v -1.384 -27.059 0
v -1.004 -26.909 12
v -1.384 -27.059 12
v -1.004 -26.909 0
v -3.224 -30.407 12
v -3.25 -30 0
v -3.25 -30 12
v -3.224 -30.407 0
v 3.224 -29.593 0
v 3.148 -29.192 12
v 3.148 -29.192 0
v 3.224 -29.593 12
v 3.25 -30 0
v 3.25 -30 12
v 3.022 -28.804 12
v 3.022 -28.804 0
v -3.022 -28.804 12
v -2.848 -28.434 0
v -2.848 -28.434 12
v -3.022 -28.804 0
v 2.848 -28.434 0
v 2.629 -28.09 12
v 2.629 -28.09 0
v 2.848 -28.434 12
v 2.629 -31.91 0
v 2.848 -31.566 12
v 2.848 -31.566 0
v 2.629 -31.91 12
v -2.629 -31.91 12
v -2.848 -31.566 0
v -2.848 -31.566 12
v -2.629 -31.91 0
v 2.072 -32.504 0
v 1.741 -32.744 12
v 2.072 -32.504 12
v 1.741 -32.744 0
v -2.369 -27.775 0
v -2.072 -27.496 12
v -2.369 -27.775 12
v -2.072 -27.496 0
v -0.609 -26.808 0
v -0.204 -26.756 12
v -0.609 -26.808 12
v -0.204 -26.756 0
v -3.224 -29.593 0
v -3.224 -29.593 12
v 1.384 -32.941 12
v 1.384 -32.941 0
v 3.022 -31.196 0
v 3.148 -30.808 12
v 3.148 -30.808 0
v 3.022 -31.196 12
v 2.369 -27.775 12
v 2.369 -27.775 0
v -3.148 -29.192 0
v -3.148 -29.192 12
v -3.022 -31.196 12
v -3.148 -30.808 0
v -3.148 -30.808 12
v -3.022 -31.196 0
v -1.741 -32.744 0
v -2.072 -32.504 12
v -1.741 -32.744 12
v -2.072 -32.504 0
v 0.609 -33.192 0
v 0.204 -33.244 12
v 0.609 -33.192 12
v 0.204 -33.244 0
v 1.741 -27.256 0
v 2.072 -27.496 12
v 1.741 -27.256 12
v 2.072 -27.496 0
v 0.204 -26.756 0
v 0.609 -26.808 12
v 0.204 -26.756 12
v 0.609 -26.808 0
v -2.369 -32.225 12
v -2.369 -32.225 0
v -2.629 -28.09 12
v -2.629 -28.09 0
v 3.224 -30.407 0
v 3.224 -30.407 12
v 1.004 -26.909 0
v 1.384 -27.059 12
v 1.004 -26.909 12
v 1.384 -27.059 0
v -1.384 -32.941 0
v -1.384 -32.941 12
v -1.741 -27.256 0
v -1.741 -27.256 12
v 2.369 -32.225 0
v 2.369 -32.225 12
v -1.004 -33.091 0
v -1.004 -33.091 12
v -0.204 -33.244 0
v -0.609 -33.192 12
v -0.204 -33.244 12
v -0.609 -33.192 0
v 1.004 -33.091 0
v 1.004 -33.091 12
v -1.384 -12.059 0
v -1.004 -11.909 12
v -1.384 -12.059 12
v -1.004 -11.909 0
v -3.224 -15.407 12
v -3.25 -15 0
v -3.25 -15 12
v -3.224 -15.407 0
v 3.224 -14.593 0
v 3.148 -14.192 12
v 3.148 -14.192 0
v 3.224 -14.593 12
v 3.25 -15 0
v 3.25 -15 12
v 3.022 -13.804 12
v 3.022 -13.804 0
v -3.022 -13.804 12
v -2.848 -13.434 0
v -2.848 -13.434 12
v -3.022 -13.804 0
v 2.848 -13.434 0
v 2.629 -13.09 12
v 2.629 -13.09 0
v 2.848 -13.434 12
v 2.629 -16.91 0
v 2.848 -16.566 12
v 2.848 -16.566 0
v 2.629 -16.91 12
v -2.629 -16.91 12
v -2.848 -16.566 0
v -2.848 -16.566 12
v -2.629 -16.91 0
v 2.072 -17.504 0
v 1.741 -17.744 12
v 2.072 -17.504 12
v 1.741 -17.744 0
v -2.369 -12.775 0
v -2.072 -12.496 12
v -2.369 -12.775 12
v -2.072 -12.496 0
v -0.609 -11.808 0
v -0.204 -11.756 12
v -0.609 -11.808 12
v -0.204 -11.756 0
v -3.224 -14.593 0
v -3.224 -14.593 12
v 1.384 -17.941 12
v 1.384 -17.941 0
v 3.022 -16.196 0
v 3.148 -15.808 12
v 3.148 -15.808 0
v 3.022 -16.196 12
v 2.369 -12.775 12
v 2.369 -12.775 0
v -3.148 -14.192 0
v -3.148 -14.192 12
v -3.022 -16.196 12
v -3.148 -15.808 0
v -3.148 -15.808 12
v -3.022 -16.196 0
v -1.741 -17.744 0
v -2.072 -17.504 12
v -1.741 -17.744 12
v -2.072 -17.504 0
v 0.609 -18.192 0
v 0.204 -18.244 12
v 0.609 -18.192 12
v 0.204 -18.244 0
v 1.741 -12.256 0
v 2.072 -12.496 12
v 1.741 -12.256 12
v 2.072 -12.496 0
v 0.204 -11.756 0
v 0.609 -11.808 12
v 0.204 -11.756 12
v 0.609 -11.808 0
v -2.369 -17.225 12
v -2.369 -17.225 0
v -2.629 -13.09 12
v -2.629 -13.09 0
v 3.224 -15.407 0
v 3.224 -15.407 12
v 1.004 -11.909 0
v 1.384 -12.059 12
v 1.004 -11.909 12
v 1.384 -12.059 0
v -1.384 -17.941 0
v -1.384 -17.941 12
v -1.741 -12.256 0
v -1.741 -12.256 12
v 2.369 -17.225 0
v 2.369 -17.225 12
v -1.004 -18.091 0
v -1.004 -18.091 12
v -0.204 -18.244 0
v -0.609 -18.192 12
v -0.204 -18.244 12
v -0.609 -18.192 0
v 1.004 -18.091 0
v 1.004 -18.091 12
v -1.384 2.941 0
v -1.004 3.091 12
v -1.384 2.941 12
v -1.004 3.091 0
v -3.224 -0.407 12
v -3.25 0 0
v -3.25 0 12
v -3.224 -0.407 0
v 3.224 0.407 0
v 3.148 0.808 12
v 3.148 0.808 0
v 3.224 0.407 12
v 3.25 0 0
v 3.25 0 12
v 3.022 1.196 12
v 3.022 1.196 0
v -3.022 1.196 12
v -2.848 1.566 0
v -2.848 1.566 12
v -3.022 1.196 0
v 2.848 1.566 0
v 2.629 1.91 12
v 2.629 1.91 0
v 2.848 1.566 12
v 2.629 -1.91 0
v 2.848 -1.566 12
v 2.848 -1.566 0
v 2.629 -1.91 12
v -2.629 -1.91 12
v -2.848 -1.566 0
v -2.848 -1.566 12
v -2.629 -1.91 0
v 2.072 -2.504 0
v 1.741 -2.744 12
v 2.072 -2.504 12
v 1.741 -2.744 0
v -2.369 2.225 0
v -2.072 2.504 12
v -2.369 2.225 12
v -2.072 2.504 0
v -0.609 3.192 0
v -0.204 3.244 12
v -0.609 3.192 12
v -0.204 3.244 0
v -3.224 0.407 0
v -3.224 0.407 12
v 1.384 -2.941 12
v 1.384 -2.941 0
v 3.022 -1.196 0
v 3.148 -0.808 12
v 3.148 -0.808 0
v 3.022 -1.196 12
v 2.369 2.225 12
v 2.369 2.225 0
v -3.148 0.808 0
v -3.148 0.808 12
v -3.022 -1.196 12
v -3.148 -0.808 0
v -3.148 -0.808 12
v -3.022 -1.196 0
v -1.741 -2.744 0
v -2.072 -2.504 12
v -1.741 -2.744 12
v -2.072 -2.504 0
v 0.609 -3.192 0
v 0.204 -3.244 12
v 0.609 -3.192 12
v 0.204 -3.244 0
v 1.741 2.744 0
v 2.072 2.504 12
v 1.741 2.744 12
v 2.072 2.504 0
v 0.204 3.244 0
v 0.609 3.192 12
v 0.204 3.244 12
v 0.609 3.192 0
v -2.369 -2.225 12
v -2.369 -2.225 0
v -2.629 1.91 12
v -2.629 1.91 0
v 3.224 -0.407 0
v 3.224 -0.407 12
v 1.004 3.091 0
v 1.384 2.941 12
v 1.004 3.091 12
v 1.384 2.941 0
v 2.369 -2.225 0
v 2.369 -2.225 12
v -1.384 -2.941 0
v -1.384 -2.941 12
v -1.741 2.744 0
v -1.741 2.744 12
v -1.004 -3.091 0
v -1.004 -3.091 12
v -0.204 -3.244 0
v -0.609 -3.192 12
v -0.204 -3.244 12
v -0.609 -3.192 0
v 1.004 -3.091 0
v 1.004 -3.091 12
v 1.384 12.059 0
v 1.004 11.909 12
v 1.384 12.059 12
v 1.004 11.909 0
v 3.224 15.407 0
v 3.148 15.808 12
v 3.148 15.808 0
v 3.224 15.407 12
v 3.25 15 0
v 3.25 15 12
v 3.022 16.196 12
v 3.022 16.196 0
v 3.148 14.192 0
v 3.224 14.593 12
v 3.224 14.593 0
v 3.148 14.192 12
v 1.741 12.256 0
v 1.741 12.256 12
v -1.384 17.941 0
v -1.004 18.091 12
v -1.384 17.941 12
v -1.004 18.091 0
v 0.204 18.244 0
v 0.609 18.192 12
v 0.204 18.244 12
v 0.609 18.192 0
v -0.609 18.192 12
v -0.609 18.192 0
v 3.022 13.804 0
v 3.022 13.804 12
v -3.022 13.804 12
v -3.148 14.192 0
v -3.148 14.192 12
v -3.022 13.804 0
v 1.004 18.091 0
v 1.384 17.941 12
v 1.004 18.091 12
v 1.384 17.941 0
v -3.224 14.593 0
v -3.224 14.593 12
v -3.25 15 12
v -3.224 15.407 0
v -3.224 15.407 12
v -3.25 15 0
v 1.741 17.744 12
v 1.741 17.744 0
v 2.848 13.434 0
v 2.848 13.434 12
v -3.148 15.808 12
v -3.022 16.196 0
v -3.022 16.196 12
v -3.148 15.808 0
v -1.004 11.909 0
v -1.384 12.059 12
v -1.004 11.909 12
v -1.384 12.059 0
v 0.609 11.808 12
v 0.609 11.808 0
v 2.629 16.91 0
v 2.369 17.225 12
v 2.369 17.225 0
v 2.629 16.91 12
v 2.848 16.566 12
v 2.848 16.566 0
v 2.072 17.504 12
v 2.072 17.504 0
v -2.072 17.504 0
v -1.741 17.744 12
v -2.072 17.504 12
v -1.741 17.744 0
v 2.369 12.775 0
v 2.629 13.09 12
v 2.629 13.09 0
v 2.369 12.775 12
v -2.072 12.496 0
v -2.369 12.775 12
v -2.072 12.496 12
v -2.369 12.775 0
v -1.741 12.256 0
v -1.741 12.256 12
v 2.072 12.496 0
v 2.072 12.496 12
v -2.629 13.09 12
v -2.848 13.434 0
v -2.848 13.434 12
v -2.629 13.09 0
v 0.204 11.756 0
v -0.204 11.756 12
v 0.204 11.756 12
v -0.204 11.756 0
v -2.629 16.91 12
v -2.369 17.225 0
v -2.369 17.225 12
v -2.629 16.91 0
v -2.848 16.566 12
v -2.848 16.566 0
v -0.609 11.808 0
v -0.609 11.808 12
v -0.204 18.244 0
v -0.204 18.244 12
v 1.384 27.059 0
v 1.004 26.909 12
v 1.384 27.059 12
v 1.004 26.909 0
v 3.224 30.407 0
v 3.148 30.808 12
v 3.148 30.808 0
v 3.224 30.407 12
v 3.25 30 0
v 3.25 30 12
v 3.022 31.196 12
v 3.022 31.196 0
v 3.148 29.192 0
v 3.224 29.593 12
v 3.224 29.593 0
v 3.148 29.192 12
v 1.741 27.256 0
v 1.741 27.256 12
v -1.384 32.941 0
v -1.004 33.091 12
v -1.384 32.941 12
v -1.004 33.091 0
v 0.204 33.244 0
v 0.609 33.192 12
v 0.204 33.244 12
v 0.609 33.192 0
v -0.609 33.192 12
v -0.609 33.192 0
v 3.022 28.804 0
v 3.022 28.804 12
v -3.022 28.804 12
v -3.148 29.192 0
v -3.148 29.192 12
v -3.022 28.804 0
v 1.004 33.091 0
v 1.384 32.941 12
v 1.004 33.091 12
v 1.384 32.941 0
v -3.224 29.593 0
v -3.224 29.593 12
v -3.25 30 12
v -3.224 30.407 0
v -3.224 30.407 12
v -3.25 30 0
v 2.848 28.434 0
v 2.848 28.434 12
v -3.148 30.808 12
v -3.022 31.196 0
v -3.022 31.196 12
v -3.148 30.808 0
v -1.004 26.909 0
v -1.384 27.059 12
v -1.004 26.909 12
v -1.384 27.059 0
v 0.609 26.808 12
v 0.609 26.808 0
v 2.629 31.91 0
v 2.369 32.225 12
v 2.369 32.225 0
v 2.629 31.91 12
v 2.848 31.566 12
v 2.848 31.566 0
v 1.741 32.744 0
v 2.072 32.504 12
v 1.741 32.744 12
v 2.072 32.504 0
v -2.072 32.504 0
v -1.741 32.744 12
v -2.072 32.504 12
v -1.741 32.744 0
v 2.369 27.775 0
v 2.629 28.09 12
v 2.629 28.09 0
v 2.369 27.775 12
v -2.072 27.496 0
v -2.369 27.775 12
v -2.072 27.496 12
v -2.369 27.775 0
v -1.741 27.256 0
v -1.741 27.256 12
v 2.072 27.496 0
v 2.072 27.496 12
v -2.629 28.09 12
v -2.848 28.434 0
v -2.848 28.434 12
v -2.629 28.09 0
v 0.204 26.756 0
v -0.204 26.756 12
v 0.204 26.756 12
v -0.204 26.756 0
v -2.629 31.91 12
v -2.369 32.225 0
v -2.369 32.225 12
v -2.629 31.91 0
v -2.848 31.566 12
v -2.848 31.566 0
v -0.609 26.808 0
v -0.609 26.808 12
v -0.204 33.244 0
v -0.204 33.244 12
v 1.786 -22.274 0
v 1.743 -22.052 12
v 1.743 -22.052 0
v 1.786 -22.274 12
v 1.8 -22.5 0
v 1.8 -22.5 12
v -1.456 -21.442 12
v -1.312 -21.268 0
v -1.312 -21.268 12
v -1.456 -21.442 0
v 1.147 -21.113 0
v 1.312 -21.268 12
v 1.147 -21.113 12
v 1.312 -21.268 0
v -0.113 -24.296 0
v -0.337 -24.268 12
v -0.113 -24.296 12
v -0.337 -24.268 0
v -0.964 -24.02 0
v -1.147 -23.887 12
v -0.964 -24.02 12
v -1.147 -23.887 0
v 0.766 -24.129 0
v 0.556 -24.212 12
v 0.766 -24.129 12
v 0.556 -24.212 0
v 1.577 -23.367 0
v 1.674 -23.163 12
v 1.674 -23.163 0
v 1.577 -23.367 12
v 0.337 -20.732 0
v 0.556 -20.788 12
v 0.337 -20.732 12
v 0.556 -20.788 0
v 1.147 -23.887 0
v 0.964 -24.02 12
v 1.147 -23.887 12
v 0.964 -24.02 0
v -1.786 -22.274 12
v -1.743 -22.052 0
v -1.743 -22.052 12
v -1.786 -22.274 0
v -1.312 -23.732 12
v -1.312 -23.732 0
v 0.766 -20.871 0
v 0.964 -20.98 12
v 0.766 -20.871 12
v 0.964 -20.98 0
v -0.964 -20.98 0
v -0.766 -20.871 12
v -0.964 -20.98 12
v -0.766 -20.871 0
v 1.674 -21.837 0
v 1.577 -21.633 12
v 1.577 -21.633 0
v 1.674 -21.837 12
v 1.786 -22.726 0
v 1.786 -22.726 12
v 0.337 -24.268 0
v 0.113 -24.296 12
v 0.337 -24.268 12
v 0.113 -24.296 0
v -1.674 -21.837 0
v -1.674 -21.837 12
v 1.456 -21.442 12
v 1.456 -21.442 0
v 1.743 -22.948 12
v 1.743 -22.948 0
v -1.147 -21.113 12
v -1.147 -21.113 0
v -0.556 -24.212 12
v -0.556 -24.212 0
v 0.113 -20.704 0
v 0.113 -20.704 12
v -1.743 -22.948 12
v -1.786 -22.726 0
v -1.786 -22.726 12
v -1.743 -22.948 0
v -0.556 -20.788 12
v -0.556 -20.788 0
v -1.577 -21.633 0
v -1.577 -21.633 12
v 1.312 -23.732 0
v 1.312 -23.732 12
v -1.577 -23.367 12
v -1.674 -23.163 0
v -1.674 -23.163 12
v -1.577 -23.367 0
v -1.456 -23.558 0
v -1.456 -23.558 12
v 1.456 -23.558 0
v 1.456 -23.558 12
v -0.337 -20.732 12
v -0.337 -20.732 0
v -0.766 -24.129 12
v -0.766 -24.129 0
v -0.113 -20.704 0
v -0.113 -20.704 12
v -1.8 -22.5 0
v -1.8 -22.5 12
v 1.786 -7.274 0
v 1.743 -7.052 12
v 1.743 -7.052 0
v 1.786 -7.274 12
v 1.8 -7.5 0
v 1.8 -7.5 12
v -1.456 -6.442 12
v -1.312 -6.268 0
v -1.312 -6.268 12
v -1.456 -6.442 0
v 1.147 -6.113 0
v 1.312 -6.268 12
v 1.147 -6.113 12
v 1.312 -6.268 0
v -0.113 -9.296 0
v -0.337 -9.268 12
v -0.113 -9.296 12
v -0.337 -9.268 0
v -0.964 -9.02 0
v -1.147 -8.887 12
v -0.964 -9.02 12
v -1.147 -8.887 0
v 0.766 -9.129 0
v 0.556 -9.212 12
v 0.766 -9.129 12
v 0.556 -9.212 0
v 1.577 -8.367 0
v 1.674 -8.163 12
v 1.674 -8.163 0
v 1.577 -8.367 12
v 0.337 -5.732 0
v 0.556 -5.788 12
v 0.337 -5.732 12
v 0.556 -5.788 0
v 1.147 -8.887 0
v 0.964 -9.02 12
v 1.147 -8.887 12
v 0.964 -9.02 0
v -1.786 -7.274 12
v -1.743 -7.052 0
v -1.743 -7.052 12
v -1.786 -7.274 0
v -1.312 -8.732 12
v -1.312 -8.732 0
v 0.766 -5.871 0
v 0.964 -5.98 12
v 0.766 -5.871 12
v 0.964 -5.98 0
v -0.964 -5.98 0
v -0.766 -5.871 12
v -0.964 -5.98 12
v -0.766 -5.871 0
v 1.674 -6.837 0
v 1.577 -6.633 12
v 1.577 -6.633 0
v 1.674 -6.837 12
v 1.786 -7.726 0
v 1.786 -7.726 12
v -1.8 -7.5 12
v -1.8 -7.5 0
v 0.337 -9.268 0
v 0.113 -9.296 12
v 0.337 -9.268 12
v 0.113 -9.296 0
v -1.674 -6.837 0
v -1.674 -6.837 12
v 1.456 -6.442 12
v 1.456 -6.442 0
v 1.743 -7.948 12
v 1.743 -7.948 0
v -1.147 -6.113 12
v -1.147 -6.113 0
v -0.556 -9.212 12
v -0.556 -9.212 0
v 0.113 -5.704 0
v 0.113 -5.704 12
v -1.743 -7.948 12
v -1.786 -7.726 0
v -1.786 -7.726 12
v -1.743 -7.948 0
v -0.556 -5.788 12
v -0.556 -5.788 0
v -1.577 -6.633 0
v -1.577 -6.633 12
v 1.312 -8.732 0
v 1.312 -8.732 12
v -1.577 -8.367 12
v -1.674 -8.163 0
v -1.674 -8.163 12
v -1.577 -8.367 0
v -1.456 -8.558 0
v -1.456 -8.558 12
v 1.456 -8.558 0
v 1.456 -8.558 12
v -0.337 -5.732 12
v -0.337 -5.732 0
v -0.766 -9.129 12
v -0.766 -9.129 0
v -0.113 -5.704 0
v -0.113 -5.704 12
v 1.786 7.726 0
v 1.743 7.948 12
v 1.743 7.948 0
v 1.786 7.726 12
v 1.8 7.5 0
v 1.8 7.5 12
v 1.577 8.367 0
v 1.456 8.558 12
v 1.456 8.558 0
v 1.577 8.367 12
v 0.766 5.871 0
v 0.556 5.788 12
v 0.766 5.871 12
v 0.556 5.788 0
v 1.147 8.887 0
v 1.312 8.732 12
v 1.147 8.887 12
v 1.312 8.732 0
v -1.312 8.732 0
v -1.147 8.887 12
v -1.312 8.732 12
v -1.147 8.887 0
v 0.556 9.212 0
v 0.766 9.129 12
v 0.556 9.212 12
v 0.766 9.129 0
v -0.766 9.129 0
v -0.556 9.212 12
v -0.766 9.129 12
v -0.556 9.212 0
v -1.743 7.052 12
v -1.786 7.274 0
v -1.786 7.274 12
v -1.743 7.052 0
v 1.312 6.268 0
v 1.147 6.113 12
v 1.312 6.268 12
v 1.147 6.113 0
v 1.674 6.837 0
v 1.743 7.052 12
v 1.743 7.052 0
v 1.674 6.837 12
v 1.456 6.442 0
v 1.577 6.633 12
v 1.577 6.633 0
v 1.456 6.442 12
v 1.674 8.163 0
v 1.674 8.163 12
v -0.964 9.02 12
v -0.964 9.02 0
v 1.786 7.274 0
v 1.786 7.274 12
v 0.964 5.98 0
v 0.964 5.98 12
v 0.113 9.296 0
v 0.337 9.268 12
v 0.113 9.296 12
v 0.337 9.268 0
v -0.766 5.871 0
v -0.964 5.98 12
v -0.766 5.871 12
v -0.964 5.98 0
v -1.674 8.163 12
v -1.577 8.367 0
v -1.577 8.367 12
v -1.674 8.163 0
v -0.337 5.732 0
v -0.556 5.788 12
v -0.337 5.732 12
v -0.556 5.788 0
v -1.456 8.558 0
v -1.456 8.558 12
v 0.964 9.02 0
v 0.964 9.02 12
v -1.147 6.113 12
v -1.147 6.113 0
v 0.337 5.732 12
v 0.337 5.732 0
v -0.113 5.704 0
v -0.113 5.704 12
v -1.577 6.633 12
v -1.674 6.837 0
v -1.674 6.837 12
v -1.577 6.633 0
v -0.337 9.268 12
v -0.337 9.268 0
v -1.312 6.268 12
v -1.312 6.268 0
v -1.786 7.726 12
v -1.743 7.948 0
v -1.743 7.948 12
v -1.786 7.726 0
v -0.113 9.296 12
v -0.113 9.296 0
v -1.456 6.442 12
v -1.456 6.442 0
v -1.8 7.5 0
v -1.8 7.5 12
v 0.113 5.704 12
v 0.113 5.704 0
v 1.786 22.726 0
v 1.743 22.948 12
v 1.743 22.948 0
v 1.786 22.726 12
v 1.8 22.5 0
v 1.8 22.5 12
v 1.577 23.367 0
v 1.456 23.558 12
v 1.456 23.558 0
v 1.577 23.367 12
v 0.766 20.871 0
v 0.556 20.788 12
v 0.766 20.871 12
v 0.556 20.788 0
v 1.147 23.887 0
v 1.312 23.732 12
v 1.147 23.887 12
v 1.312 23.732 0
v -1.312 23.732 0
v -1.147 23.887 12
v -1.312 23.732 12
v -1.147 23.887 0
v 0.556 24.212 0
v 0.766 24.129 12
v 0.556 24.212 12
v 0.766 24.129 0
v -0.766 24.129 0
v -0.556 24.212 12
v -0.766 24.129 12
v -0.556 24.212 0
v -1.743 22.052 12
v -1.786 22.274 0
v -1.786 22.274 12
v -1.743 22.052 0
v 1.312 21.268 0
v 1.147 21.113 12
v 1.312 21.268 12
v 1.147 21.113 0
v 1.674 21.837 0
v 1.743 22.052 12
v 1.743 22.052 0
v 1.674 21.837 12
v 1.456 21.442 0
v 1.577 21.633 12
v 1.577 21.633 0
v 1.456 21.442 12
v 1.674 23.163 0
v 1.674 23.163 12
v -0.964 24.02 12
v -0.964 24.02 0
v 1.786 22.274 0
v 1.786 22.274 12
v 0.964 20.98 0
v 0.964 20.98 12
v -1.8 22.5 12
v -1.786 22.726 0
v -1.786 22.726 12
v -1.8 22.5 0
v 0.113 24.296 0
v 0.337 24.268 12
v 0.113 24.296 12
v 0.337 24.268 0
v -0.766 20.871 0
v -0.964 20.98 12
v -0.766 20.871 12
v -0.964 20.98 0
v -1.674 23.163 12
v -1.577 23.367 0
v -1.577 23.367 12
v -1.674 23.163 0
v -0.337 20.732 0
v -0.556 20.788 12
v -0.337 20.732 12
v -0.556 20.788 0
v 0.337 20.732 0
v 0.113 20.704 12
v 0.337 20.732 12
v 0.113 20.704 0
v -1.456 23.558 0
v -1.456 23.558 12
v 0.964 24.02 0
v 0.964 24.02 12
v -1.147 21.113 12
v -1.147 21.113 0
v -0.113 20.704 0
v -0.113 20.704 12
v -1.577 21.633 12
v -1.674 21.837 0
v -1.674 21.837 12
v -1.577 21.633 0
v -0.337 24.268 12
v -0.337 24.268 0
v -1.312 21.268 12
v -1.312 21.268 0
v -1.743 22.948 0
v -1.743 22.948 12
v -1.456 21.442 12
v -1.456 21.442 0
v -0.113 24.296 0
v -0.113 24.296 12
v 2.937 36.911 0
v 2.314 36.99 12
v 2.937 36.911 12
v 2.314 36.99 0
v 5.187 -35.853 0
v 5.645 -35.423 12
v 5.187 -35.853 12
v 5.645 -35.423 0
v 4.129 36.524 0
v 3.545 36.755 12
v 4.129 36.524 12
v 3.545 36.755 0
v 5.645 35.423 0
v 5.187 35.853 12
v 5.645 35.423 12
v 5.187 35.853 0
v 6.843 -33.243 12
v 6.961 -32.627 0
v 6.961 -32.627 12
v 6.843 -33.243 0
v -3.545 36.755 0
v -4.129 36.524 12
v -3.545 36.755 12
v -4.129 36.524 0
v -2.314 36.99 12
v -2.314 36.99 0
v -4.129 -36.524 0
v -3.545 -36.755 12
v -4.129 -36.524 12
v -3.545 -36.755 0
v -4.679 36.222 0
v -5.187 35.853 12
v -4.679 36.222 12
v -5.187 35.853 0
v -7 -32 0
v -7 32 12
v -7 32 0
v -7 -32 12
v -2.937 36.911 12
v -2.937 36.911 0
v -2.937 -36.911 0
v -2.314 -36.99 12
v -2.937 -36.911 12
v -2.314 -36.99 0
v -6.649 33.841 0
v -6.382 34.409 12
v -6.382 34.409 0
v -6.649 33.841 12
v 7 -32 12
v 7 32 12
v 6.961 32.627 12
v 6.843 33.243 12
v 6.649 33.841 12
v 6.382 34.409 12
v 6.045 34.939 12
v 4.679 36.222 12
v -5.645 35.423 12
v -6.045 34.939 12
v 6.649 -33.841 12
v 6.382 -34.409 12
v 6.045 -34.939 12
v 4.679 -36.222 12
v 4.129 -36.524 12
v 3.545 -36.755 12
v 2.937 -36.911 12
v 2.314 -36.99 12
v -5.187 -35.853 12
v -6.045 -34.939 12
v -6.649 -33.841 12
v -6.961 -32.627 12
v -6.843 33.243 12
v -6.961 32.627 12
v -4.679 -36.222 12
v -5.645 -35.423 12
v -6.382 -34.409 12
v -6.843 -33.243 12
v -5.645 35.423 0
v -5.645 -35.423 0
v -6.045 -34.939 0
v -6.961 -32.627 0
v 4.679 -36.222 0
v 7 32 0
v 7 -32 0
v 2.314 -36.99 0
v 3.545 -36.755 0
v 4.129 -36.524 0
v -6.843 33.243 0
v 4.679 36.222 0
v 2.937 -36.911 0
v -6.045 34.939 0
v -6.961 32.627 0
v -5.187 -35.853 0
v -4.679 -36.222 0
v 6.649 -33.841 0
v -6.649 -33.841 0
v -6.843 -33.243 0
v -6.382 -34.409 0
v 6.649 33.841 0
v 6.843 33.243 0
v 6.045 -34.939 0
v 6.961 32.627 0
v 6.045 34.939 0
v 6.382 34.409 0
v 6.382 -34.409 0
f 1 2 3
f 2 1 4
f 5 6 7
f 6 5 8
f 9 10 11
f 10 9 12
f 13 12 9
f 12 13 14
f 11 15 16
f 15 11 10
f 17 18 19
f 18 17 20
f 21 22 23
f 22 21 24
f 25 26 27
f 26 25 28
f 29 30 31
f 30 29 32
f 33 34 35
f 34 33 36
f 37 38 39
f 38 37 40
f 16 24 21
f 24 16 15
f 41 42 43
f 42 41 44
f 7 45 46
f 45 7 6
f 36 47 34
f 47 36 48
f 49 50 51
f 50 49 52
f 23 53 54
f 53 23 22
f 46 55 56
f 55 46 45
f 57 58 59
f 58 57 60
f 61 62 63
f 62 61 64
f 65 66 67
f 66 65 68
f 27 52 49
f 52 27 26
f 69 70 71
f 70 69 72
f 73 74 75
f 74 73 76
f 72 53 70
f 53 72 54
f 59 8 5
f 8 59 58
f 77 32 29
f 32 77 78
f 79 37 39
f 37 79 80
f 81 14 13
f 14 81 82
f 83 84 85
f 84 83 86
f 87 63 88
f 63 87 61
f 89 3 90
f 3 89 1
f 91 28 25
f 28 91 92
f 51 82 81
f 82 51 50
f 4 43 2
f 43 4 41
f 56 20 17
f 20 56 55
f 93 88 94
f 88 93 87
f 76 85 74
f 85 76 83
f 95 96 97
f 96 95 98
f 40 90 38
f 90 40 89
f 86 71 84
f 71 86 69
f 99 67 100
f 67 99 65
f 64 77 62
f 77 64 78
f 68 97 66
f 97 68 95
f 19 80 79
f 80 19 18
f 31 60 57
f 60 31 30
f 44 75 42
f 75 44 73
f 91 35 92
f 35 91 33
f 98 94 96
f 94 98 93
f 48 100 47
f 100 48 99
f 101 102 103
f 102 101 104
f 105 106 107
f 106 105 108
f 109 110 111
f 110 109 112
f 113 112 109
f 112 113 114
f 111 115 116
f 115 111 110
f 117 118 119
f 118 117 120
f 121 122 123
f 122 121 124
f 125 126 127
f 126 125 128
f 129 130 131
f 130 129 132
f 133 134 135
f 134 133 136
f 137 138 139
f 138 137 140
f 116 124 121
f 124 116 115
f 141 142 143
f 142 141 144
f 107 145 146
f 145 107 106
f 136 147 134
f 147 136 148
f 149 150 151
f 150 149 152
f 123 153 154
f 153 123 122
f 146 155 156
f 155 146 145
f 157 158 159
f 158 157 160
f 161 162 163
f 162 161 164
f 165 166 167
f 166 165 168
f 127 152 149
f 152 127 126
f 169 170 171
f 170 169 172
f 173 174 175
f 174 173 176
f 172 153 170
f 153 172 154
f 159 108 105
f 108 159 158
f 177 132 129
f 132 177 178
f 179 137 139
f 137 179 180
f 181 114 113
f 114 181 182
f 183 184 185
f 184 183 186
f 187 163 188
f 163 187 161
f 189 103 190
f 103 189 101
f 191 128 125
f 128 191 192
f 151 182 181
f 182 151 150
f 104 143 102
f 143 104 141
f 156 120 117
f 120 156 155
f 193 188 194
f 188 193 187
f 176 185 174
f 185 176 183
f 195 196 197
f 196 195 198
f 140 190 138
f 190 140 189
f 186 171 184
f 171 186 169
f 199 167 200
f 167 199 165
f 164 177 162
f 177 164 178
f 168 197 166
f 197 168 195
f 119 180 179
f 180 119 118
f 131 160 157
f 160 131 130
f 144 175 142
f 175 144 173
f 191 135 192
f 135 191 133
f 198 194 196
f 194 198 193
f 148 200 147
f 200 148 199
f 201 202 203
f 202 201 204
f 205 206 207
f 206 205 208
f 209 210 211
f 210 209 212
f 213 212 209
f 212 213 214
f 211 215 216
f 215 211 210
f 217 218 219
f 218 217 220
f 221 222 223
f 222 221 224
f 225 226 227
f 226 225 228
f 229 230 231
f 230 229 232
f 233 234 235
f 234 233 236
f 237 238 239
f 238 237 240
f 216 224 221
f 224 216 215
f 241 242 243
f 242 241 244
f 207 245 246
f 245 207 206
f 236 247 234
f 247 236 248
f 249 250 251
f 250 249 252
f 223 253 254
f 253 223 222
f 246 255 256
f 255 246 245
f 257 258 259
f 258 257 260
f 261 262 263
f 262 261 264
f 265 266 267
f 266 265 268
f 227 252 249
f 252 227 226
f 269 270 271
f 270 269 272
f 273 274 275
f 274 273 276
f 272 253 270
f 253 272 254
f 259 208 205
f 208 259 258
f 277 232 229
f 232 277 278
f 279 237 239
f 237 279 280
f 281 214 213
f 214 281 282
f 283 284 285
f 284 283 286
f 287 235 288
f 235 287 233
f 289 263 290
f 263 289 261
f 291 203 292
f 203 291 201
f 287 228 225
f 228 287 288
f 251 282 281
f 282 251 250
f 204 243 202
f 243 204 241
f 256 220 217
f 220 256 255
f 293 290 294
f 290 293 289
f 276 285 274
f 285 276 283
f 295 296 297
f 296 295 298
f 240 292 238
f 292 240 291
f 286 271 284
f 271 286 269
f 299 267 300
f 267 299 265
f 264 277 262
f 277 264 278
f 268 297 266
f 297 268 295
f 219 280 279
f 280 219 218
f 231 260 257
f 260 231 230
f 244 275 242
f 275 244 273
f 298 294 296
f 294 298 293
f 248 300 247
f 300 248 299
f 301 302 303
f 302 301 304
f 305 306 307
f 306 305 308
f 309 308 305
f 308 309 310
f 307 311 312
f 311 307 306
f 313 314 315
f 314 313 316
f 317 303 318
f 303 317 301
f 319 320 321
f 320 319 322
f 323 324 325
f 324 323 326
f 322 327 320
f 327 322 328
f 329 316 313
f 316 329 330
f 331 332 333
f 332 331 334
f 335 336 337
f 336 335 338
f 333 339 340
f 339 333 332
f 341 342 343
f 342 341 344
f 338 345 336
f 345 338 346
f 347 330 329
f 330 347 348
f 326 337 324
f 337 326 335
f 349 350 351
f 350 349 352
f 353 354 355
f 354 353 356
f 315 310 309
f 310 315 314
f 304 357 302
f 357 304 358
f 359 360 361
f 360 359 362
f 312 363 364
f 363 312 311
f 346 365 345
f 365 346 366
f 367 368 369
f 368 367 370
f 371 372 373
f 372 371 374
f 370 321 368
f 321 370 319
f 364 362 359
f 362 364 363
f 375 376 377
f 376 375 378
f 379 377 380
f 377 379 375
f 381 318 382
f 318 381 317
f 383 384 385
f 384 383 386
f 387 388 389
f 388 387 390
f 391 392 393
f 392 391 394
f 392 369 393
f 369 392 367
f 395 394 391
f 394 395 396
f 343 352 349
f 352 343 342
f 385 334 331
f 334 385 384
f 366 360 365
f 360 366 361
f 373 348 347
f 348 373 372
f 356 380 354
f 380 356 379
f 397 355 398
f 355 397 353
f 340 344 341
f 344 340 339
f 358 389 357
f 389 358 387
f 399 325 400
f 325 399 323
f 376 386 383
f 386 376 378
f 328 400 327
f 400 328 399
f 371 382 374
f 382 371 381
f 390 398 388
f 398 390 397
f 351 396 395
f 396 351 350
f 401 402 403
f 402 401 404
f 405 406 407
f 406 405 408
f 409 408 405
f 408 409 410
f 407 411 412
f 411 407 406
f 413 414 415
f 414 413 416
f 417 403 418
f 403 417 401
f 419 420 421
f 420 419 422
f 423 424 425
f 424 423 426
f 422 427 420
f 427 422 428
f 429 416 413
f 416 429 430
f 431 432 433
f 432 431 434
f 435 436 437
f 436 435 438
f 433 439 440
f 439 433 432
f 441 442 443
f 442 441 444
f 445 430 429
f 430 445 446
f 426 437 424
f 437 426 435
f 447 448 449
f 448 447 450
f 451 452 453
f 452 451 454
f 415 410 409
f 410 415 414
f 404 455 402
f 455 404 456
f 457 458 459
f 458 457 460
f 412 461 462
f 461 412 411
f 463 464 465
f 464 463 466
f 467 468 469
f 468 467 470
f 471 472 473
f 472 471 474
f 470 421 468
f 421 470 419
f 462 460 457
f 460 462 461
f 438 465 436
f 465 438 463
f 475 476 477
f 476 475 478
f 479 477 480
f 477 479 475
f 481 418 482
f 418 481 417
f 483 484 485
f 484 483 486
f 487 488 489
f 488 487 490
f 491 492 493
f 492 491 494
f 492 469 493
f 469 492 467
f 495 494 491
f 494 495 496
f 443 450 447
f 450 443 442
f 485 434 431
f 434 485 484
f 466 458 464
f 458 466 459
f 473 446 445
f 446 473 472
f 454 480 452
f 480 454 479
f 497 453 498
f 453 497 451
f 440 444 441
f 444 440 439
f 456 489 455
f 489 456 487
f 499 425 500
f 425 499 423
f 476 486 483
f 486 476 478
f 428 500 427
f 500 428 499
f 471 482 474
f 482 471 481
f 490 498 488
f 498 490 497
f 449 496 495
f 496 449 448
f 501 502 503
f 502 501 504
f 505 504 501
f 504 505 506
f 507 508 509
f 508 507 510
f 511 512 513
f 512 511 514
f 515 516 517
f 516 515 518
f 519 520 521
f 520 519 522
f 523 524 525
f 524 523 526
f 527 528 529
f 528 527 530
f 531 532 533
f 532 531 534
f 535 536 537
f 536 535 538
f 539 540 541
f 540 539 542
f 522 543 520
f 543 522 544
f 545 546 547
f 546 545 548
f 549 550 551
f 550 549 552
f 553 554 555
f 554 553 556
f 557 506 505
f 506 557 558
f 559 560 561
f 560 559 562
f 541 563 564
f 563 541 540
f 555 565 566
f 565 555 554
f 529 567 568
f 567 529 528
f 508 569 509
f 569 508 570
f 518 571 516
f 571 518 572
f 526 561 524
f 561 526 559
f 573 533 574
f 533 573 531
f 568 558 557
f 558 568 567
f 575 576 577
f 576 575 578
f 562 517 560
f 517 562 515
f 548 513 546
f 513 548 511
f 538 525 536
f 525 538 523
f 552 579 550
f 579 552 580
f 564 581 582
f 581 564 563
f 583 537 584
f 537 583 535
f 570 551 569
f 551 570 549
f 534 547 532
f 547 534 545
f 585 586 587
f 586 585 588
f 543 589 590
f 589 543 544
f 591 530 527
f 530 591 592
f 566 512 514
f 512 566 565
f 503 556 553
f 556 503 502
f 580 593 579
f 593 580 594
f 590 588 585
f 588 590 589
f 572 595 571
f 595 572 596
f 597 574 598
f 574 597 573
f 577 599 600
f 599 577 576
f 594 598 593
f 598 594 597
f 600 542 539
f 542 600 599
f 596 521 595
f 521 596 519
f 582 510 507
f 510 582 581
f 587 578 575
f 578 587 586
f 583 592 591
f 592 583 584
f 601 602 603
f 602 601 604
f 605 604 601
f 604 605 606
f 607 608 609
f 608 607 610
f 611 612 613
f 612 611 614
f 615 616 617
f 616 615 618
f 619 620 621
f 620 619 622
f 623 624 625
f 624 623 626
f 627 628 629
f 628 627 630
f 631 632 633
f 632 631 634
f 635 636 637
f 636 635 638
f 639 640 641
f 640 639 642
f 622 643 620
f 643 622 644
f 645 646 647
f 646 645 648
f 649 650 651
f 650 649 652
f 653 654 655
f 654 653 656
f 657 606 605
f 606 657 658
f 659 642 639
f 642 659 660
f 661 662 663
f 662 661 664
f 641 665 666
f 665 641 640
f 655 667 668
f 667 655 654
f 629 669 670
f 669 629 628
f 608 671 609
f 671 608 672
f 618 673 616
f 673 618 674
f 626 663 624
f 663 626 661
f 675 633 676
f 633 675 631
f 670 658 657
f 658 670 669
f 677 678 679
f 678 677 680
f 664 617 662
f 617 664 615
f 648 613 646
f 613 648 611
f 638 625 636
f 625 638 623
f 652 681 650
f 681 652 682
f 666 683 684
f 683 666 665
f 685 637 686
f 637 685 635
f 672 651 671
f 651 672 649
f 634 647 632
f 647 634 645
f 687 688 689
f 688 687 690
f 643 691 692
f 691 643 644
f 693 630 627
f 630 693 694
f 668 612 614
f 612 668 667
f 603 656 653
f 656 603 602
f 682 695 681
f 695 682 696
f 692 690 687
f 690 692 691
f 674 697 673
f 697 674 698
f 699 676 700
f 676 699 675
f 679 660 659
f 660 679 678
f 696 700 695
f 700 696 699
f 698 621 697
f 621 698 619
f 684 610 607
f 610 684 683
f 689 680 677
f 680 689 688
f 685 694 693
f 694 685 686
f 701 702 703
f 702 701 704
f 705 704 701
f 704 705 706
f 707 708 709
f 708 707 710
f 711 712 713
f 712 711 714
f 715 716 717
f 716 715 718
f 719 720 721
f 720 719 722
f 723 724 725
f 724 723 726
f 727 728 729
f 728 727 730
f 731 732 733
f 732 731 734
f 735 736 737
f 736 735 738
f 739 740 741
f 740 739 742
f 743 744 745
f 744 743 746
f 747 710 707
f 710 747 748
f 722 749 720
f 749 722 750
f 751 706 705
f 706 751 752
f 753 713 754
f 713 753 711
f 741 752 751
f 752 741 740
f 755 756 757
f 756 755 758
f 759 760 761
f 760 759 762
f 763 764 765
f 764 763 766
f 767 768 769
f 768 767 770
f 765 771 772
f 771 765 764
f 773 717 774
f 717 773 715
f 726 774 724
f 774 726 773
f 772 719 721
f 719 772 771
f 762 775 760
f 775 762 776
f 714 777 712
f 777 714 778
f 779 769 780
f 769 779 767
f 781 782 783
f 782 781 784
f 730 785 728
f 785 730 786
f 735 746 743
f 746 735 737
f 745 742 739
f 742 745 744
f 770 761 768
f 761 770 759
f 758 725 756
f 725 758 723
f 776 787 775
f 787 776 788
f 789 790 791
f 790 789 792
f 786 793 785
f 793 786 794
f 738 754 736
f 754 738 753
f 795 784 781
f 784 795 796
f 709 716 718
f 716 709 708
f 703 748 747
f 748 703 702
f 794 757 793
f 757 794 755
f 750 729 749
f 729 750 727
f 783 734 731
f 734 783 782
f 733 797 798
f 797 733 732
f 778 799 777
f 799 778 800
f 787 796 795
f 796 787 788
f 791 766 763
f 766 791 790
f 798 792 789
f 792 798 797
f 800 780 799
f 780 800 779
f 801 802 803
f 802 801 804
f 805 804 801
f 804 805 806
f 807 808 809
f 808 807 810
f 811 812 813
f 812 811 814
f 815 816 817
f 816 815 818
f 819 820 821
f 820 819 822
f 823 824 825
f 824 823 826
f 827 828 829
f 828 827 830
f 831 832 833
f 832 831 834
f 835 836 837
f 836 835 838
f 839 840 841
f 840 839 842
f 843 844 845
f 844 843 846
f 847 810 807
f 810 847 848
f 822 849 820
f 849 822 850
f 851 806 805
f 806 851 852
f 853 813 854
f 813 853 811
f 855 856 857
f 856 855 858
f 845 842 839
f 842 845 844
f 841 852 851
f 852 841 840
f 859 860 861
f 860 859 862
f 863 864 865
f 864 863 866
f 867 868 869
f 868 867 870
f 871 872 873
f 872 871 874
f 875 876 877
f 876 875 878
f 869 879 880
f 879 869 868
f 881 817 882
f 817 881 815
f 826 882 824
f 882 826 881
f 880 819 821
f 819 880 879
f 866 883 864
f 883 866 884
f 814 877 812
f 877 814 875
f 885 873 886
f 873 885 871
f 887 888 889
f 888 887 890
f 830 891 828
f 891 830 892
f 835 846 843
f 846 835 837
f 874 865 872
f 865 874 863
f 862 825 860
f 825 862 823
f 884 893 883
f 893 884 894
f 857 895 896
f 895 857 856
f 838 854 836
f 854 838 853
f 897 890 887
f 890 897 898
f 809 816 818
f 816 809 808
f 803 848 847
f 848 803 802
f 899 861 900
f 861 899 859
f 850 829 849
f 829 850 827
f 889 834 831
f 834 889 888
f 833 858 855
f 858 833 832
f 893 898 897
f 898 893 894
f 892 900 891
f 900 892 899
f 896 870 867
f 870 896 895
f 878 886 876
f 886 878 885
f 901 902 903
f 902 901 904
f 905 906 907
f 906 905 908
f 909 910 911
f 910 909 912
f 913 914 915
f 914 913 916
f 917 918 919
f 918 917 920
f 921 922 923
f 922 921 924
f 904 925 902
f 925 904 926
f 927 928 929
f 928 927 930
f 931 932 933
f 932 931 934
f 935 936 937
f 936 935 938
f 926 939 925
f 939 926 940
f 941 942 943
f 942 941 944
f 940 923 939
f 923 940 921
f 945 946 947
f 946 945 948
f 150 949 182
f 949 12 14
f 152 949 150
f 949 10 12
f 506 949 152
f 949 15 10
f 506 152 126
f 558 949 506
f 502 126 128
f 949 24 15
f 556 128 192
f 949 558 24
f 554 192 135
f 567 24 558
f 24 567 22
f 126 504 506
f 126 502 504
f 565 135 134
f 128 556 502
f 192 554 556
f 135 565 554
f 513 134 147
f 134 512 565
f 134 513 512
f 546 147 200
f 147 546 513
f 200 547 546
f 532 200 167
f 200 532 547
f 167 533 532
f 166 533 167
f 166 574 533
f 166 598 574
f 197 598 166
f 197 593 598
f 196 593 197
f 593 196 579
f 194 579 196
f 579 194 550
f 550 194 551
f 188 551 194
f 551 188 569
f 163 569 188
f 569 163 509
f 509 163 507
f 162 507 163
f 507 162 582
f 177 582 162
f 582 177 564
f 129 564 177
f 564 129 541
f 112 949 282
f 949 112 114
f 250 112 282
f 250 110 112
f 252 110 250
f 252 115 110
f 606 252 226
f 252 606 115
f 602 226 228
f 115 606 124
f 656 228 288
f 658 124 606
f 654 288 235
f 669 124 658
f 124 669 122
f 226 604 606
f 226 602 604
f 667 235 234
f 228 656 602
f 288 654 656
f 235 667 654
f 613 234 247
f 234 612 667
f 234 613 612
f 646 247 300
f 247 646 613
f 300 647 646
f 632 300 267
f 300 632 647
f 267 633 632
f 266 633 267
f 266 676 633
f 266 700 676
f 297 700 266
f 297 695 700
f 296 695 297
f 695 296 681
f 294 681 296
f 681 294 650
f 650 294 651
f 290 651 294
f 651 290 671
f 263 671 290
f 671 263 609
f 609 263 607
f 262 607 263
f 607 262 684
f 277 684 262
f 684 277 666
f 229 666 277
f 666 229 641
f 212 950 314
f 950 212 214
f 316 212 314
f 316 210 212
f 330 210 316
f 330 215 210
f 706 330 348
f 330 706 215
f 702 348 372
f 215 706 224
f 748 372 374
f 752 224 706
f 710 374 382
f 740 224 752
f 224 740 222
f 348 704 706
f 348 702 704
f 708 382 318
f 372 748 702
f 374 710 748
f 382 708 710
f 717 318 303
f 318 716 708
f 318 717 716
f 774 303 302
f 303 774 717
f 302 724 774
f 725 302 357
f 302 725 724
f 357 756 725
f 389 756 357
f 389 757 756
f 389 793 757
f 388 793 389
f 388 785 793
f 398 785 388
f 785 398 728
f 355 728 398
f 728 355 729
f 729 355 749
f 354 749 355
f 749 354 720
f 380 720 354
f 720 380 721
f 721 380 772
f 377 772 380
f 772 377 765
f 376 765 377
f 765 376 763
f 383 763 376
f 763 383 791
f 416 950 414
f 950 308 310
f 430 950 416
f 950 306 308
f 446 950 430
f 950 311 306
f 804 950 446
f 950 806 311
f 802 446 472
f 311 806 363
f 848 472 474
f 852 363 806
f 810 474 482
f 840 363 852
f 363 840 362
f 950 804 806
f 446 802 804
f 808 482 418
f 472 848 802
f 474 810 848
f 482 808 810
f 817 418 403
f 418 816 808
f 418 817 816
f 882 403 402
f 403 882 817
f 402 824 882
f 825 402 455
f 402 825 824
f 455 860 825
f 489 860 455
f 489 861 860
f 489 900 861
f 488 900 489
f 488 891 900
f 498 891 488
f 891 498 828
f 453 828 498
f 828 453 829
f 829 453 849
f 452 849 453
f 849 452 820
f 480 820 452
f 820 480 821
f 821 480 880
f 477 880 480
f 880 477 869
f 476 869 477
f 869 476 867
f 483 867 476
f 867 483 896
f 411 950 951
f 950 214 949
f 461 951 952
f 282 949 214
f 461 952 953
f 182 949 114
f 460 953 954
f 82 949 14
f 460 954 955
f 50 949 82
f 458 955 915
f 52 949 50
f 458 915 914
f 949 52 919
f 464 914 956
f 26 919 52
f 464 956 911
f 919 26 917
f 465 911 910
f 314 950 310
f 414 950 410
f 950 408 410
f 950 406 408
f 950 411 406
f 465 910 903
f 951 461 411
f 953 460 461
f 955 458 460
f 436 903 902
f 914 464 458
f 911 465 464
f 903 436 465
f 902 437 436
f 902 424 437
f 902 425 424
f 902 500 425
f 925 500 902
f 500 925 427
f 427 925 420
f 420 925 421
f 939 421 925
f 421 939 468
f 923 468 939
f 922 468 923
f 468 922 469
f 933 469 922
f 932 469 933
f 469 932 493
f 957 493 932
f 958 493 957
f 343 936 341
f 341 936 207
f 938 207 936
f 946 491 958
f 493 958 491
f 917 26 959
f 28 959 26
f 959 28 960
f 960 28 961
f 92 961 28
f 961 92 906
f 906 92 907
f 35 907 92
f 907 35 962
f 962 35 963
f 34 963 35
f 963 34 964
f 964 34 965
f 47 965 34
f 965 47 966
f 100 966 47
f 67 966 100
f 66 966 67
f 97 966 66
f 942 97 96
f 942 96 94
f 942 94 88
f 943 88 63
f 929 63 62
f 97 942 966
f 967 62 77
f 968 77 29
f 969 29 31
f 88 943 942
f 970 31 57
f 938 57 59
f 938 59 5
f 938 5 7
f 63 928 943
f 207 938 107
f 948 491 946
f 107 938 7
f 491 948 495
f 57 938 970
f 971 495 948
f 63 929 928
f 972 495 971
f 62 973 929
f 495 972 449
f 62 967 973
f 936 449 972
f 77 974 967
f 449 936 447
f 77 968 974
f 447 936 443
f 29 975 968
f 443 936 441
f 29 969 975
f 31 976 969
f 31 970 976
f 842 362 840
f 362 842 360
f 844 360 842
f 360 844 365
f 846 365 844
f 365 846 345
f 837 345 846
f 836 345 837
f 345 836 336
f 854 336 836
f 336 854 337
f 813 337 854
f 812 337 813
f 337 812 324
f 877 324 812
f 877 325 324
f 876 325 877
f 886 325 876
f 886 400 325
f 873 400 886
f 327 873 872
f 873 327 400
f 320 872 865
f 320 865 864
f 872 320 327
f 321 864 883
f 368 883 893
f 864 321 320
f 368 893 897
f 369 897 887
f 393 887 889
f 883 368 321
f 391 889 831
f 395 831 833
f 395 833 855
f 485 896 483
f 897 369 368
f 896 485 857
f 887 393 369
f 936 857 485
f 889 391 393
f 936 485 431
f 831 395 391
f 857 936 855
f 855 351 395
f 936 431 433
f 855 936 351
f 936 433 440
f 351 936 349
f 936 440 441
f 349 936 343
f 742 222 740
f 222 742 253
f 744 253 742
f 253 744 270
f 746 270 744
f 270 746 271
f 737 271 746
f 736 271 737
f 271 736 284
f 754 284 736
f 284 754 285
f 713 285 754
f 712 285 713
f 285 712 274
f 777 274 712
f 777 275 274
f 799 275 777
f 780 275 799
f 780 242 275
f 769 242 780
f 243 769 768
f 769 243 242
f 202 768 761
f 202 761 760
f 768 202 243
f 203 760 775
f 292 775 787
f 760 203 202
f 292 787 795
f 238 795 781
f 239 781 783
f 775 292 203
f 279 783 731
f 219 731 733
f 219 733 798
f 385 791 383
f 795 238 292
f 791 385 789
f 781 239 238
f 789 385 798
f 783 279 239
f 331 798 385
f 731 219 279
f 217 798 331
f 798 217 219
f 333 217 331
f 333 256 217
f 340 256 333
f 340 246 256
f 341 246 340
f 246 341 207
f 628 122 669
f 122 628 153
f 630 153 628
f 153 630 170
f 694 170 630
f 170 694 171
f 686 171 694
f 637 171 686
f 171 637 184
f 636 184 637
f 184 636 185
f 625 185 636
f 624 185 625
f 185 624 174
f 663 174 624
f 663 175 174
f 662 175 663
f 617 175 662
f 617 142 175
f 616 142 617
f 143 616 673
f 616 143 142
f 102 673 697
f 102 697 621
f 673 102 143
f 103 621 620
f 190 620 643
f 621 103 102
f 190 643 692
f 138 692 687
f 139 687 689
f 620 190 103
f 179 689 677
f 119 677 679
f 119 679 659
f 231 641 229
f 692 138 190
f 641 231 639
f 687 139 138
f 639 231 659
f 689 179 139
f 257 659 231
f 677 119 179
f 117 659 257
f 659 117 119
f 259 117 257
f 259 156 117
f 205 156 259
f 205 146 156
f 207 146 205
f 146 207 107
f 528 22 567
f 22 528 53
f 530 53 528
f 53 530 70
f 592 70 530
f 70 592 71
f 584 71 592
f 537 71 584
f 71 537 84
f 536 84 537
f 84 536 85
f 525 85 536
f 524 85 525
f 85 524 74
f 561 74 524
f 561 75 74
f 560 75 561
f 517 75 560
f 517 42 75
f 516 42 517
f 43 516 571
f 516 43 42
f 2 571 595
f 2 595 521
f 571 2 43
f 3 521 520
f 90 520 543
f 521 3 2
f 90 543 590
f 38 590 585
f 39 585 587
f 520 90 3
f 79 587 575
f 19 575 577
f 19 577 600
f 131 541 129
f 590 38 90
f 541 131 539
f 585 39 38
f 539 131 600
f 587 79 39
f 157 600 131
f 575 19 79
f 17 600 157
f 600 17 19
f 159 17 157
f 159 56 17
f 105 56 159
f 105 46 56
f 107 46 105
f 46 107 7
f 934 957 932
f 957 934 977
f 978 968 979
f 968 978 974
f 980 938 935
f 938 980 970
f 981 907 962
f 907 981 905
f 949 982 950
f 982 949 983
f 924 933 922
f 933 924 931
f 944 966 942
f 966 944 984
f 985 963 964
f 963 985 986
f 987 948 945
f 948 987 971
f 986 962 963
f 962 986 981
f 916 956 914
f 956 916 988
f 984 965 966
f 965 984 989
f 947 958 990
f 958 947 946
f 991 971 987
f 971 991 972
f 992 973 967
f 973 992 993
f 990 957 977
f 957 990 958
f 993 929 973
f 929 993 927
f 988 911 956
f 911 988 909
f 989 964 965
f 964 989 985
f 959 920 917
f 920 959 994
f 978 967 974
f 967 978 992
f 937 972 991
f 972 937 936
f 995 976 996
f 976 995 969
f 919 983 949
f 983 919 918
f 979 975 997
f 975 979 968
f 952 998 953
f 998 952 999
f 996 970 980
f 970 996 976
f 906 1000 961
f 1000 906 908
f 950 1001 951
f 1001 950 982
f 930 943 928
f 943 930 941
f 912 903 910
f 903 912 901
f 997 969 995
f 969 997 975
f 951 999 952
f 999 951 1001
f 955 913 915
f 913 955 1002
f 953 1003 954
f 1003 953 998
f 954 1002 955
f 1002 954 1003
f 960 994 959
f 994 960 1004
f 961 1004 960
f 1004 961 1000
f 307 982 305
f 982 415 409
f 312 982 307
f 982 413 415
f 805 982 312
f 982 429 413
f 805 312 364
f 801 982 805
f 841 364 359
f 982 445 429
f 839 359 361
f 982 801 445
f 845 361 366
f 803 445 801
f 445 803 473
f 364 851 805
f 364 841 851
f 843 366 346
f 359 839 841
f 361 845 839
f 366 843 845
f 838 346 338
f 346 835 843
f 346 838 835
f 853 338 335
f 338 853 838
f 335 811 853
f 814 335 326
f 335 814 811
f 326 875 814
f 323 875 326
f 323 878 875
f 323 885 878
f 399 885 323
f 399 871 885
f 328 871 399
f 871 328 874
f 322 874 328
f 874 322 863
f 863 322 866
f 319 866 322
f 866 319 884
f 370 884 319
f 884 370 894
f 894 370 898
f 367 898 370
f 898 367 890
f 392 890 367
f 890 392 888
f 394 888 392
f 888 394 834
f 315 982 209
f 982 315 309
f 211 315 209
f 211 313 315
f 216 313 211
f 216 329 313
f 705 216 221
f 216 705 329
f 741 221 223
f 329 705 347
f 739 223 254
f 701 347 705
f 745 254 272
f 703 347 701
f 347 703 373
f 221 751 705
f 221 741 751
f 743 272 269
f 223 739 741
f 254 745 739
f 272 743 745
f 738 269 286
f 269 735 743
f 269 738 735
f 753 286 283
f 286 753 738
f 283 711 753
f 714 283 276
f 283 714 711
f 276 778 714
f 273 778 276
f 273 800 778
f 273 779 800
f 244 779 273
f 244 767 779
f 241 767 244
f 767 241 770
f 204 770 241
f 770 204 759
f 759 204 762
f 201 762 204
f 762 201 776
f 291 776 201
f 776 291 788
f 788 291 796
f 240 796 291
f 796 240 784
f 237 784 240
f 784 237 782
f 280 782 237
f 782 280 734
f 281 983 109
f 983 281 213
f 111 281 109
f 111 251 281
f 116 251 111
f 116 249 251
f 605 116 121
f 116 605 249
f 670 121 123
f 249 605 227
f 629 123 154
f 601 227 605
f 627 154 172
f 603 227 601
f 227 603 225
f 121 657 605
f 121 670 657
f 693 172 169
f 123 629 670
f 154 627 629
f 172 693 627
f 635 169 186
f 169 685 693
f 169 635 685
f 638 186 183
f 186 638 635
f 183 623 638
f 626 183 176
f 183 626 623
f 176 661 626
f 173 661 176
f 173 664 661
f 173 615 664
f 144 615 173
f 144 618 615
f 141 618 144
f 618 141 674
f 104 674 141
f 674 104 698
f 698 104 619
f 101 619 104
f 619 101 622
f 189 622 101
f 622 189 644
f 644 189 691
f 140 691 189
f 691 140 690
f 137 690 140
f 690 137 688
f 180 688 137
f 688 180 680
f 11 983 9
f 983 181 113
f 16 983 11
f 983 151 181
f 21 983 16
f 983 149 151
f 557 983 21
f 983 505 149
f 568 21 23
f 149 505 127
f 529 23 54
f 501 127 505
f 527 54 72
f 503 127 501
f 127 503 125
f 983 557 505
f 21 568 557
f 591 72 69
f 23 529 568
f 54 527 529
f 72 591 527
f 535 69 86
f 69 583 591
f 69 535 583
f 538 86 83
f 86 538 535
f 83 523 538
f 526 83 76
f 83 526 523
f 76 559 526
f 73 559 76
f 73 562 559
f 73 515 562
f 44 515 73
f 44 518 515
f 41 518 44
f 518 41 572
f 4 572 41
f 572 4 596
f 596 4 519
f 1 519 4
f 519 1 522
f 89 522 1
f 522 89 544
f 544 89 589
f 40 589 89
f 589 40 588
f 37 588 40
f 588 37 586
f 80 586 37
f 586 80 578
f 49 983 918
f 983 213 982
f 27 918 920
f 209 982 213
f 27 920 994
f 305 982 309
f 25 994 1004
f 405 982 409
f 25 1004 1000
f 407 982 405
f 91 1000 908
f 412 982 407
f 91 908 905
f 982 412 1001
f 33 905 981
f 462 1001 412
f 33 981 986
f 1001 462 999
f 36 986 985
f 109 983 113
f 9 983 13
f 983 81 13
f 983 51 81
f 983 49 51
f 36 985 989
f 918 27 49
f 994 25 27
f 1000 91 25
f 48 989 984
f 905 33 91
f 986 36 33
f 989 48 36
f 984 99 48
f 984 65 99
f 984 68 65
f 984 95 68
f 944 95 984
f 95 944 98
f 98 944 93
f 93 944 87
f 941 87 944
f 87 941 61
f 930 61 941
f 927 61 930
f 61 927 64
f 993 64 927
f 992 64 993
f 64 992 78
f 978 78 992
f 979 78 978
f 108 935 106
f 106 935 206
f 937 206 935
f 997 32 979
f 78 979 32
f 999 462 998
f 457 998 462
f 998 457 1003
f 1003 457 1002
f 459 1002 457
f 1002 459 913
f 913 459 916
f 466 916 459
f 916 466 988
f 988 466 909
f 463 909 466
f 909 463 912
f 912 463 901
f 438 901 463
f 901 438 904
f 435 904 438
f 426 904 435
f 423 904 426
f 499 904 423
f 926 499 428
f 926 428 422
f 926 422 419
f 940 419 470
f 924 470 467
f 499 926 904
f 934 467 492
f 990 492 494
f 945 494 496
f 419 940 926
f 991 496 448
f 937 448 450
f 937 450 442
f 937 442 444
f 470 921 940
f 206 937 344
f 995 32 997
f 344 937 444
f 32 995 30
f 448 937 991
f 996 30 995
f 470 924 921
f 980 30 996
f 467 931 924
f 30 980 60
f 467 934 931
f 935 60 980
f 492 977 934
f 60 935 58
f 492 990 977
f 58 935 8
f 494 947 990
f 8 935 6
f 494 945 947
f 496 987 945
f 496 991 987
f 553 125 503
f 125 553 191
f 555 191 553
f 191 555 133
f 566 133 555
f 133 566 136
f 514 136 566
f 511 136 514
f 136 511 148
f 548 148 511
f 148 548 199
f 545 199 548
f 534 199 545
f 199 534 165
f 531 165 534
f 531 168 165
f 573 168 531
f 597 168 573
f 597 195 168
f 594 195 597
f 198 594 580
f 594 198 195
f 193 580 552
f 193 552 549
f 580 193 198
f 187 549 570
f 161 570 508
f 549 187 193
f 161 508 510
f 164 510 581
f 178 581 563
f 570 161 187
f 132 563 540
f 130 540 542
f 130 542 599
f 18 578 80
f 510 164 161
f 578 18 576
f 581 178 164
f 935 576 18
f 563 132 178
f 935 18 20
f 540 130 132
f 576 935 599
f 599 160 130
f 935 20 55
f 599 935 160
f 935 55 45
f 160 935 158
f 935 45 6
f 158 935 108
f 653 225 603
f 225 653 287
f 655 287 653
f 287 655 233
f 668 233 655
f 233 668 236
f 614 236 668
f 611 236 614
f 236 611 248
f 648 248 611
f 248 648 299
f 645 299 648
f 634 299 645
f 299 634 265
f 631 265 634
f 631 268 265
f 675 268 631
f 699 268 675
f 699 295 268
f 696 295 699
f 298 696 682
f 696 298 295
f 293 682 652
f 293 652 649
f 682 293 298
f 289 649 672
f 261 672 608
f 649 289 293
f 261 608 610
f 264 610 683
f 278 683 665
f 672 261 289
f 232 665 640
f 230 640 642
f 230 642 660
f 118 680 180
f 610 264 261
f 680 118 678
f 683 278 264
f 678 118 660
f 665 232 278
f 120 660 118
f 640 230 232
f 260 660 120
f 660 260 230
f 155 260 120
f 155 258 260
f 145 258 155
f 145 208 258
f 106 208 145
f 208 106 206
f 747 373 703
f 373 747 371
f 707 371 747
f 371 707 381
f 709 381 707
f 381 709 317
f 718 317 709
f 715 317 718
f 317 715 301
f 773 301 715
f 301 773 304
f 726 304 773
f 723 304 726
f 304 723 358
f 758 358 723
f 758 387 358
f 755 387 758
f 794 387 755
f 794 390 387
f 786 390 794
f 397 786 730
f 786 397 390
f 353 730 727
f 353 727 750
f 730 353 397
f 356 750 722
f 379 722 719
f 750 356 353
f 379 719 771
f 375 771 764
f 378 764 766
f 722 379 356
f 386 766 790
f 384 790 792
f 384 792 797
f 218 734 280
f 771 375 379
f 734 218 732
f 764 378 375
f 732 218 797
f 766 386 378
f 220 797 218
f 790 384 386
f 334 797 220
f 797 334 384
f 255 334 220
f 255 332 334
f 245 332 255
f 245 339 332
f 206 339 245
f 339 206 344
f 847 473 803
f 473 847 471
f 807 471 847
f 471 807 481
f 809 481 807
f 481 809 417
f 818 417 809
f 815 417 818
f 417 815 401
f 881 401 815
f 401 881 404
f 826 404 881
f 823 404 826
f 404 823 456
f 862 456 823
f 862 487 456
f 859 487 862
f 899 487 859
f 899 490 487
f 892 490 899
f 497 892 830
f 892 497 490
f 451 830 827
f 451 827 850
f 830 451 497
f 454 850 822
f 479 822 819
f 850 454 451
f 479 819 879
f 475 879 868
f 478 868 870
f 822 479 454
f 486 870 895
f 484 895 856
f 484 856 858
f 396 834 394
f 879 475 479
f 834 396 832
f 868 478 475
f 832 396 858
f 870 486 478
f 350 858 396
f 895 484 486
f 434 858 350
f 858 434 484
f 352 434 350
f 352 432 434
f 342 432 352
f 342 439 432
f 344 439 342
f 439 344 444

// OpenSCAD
$fn = 50;

difference() {
	union() {
		hull() {
			translate(v = [-2.0, 32.0, 0]) {
				cylinder(h = 12, r = 5);
			}
			translate(v = [2.0, 32.0, 0]) {
				cylinder(h = 12, r = 5);
			}
			translate(v = [-2.0, -32.0, 0]) {
				cylinder(h = 12, r = 5);
			}
			translate(v = [2.0, -32.0, 0]) {
				cylinder(h = 12, r = 5);
			}
		}
	}
	union() {
		translate(v = [0.0, -30.0, 0]) {
			translate(v = [0, 0, -100]) {
				cylinder(h = 200, r = 3.25);
			}
		}
		translate(v = [0.0, -15.0, 0]) {
			translate(v = [0, 0, -100]) {
				cylinder(h = 200, r = 3.25);
			}
		}
		translate(v = [0, 0, -100]) {
			cylinder(h = 200, r = 3.25);
		}
		translate(v = [0.0, 15.0, 0]) {
			translate(v = [0, 0, -100]) {
				cylinder(h = 200, r = 3.25);
			}
		}
		translate(v = [0.0, 30.0, 0]) {
			translate(v = [0, 0, -100]) {
				cylinder(h = 200, r = 3.25);
			}
		}
		translate(v = [0.0, -30.0, 0]) {
			translate(v = [0, 0, -100]) {
				cylinder(h = 200, r = 1.8);
			}
		}
		translate(v = [0.0, -22.5, 0]) {
			translate(v = [0, 0, -100]) {
				cylinder(h = 200, r = 1.8);
			}
		}
		translate(v = [0.0, -15.0, 0]) {
			translate(v = [0, 0, -100]) {
				cylinder(h = 200, r = 1.8);
			}
		}
		translate(v = [0.0, -7.5, 0]) {
			translate(v = [0, 0, -100]) {
				cylinder(h = 200, r = 1.8);
			}
		}
		translate(v = [0, 0, -100]) {
			cylinder(h = 200, r = 1.8);
		}
		translate(v = [0.0, 7.5, 0]) {
			translate(v = [0, 0, -100]) {
				cylinder(h = 200, r = 1.8);
			}
		}
		translate(v = [0.0, 15.0, 0]) {
			translate(v = [0, 0, -100]) {
				cylinder(h = 200, r = 1.8);
			}
		}
		translate(v = [0.0, 22.5, 0]) {
			translate(v = [0, 0, -100]) {
				cylinder(h = 200, r = 1.8);
			}
		}
		translate(v = [0.0, 30.0, 0]) {
			translate(v = [0, 0, -100]) {
				cylinder(h = 200, r = 1.8);
			}
		}
	}
}
